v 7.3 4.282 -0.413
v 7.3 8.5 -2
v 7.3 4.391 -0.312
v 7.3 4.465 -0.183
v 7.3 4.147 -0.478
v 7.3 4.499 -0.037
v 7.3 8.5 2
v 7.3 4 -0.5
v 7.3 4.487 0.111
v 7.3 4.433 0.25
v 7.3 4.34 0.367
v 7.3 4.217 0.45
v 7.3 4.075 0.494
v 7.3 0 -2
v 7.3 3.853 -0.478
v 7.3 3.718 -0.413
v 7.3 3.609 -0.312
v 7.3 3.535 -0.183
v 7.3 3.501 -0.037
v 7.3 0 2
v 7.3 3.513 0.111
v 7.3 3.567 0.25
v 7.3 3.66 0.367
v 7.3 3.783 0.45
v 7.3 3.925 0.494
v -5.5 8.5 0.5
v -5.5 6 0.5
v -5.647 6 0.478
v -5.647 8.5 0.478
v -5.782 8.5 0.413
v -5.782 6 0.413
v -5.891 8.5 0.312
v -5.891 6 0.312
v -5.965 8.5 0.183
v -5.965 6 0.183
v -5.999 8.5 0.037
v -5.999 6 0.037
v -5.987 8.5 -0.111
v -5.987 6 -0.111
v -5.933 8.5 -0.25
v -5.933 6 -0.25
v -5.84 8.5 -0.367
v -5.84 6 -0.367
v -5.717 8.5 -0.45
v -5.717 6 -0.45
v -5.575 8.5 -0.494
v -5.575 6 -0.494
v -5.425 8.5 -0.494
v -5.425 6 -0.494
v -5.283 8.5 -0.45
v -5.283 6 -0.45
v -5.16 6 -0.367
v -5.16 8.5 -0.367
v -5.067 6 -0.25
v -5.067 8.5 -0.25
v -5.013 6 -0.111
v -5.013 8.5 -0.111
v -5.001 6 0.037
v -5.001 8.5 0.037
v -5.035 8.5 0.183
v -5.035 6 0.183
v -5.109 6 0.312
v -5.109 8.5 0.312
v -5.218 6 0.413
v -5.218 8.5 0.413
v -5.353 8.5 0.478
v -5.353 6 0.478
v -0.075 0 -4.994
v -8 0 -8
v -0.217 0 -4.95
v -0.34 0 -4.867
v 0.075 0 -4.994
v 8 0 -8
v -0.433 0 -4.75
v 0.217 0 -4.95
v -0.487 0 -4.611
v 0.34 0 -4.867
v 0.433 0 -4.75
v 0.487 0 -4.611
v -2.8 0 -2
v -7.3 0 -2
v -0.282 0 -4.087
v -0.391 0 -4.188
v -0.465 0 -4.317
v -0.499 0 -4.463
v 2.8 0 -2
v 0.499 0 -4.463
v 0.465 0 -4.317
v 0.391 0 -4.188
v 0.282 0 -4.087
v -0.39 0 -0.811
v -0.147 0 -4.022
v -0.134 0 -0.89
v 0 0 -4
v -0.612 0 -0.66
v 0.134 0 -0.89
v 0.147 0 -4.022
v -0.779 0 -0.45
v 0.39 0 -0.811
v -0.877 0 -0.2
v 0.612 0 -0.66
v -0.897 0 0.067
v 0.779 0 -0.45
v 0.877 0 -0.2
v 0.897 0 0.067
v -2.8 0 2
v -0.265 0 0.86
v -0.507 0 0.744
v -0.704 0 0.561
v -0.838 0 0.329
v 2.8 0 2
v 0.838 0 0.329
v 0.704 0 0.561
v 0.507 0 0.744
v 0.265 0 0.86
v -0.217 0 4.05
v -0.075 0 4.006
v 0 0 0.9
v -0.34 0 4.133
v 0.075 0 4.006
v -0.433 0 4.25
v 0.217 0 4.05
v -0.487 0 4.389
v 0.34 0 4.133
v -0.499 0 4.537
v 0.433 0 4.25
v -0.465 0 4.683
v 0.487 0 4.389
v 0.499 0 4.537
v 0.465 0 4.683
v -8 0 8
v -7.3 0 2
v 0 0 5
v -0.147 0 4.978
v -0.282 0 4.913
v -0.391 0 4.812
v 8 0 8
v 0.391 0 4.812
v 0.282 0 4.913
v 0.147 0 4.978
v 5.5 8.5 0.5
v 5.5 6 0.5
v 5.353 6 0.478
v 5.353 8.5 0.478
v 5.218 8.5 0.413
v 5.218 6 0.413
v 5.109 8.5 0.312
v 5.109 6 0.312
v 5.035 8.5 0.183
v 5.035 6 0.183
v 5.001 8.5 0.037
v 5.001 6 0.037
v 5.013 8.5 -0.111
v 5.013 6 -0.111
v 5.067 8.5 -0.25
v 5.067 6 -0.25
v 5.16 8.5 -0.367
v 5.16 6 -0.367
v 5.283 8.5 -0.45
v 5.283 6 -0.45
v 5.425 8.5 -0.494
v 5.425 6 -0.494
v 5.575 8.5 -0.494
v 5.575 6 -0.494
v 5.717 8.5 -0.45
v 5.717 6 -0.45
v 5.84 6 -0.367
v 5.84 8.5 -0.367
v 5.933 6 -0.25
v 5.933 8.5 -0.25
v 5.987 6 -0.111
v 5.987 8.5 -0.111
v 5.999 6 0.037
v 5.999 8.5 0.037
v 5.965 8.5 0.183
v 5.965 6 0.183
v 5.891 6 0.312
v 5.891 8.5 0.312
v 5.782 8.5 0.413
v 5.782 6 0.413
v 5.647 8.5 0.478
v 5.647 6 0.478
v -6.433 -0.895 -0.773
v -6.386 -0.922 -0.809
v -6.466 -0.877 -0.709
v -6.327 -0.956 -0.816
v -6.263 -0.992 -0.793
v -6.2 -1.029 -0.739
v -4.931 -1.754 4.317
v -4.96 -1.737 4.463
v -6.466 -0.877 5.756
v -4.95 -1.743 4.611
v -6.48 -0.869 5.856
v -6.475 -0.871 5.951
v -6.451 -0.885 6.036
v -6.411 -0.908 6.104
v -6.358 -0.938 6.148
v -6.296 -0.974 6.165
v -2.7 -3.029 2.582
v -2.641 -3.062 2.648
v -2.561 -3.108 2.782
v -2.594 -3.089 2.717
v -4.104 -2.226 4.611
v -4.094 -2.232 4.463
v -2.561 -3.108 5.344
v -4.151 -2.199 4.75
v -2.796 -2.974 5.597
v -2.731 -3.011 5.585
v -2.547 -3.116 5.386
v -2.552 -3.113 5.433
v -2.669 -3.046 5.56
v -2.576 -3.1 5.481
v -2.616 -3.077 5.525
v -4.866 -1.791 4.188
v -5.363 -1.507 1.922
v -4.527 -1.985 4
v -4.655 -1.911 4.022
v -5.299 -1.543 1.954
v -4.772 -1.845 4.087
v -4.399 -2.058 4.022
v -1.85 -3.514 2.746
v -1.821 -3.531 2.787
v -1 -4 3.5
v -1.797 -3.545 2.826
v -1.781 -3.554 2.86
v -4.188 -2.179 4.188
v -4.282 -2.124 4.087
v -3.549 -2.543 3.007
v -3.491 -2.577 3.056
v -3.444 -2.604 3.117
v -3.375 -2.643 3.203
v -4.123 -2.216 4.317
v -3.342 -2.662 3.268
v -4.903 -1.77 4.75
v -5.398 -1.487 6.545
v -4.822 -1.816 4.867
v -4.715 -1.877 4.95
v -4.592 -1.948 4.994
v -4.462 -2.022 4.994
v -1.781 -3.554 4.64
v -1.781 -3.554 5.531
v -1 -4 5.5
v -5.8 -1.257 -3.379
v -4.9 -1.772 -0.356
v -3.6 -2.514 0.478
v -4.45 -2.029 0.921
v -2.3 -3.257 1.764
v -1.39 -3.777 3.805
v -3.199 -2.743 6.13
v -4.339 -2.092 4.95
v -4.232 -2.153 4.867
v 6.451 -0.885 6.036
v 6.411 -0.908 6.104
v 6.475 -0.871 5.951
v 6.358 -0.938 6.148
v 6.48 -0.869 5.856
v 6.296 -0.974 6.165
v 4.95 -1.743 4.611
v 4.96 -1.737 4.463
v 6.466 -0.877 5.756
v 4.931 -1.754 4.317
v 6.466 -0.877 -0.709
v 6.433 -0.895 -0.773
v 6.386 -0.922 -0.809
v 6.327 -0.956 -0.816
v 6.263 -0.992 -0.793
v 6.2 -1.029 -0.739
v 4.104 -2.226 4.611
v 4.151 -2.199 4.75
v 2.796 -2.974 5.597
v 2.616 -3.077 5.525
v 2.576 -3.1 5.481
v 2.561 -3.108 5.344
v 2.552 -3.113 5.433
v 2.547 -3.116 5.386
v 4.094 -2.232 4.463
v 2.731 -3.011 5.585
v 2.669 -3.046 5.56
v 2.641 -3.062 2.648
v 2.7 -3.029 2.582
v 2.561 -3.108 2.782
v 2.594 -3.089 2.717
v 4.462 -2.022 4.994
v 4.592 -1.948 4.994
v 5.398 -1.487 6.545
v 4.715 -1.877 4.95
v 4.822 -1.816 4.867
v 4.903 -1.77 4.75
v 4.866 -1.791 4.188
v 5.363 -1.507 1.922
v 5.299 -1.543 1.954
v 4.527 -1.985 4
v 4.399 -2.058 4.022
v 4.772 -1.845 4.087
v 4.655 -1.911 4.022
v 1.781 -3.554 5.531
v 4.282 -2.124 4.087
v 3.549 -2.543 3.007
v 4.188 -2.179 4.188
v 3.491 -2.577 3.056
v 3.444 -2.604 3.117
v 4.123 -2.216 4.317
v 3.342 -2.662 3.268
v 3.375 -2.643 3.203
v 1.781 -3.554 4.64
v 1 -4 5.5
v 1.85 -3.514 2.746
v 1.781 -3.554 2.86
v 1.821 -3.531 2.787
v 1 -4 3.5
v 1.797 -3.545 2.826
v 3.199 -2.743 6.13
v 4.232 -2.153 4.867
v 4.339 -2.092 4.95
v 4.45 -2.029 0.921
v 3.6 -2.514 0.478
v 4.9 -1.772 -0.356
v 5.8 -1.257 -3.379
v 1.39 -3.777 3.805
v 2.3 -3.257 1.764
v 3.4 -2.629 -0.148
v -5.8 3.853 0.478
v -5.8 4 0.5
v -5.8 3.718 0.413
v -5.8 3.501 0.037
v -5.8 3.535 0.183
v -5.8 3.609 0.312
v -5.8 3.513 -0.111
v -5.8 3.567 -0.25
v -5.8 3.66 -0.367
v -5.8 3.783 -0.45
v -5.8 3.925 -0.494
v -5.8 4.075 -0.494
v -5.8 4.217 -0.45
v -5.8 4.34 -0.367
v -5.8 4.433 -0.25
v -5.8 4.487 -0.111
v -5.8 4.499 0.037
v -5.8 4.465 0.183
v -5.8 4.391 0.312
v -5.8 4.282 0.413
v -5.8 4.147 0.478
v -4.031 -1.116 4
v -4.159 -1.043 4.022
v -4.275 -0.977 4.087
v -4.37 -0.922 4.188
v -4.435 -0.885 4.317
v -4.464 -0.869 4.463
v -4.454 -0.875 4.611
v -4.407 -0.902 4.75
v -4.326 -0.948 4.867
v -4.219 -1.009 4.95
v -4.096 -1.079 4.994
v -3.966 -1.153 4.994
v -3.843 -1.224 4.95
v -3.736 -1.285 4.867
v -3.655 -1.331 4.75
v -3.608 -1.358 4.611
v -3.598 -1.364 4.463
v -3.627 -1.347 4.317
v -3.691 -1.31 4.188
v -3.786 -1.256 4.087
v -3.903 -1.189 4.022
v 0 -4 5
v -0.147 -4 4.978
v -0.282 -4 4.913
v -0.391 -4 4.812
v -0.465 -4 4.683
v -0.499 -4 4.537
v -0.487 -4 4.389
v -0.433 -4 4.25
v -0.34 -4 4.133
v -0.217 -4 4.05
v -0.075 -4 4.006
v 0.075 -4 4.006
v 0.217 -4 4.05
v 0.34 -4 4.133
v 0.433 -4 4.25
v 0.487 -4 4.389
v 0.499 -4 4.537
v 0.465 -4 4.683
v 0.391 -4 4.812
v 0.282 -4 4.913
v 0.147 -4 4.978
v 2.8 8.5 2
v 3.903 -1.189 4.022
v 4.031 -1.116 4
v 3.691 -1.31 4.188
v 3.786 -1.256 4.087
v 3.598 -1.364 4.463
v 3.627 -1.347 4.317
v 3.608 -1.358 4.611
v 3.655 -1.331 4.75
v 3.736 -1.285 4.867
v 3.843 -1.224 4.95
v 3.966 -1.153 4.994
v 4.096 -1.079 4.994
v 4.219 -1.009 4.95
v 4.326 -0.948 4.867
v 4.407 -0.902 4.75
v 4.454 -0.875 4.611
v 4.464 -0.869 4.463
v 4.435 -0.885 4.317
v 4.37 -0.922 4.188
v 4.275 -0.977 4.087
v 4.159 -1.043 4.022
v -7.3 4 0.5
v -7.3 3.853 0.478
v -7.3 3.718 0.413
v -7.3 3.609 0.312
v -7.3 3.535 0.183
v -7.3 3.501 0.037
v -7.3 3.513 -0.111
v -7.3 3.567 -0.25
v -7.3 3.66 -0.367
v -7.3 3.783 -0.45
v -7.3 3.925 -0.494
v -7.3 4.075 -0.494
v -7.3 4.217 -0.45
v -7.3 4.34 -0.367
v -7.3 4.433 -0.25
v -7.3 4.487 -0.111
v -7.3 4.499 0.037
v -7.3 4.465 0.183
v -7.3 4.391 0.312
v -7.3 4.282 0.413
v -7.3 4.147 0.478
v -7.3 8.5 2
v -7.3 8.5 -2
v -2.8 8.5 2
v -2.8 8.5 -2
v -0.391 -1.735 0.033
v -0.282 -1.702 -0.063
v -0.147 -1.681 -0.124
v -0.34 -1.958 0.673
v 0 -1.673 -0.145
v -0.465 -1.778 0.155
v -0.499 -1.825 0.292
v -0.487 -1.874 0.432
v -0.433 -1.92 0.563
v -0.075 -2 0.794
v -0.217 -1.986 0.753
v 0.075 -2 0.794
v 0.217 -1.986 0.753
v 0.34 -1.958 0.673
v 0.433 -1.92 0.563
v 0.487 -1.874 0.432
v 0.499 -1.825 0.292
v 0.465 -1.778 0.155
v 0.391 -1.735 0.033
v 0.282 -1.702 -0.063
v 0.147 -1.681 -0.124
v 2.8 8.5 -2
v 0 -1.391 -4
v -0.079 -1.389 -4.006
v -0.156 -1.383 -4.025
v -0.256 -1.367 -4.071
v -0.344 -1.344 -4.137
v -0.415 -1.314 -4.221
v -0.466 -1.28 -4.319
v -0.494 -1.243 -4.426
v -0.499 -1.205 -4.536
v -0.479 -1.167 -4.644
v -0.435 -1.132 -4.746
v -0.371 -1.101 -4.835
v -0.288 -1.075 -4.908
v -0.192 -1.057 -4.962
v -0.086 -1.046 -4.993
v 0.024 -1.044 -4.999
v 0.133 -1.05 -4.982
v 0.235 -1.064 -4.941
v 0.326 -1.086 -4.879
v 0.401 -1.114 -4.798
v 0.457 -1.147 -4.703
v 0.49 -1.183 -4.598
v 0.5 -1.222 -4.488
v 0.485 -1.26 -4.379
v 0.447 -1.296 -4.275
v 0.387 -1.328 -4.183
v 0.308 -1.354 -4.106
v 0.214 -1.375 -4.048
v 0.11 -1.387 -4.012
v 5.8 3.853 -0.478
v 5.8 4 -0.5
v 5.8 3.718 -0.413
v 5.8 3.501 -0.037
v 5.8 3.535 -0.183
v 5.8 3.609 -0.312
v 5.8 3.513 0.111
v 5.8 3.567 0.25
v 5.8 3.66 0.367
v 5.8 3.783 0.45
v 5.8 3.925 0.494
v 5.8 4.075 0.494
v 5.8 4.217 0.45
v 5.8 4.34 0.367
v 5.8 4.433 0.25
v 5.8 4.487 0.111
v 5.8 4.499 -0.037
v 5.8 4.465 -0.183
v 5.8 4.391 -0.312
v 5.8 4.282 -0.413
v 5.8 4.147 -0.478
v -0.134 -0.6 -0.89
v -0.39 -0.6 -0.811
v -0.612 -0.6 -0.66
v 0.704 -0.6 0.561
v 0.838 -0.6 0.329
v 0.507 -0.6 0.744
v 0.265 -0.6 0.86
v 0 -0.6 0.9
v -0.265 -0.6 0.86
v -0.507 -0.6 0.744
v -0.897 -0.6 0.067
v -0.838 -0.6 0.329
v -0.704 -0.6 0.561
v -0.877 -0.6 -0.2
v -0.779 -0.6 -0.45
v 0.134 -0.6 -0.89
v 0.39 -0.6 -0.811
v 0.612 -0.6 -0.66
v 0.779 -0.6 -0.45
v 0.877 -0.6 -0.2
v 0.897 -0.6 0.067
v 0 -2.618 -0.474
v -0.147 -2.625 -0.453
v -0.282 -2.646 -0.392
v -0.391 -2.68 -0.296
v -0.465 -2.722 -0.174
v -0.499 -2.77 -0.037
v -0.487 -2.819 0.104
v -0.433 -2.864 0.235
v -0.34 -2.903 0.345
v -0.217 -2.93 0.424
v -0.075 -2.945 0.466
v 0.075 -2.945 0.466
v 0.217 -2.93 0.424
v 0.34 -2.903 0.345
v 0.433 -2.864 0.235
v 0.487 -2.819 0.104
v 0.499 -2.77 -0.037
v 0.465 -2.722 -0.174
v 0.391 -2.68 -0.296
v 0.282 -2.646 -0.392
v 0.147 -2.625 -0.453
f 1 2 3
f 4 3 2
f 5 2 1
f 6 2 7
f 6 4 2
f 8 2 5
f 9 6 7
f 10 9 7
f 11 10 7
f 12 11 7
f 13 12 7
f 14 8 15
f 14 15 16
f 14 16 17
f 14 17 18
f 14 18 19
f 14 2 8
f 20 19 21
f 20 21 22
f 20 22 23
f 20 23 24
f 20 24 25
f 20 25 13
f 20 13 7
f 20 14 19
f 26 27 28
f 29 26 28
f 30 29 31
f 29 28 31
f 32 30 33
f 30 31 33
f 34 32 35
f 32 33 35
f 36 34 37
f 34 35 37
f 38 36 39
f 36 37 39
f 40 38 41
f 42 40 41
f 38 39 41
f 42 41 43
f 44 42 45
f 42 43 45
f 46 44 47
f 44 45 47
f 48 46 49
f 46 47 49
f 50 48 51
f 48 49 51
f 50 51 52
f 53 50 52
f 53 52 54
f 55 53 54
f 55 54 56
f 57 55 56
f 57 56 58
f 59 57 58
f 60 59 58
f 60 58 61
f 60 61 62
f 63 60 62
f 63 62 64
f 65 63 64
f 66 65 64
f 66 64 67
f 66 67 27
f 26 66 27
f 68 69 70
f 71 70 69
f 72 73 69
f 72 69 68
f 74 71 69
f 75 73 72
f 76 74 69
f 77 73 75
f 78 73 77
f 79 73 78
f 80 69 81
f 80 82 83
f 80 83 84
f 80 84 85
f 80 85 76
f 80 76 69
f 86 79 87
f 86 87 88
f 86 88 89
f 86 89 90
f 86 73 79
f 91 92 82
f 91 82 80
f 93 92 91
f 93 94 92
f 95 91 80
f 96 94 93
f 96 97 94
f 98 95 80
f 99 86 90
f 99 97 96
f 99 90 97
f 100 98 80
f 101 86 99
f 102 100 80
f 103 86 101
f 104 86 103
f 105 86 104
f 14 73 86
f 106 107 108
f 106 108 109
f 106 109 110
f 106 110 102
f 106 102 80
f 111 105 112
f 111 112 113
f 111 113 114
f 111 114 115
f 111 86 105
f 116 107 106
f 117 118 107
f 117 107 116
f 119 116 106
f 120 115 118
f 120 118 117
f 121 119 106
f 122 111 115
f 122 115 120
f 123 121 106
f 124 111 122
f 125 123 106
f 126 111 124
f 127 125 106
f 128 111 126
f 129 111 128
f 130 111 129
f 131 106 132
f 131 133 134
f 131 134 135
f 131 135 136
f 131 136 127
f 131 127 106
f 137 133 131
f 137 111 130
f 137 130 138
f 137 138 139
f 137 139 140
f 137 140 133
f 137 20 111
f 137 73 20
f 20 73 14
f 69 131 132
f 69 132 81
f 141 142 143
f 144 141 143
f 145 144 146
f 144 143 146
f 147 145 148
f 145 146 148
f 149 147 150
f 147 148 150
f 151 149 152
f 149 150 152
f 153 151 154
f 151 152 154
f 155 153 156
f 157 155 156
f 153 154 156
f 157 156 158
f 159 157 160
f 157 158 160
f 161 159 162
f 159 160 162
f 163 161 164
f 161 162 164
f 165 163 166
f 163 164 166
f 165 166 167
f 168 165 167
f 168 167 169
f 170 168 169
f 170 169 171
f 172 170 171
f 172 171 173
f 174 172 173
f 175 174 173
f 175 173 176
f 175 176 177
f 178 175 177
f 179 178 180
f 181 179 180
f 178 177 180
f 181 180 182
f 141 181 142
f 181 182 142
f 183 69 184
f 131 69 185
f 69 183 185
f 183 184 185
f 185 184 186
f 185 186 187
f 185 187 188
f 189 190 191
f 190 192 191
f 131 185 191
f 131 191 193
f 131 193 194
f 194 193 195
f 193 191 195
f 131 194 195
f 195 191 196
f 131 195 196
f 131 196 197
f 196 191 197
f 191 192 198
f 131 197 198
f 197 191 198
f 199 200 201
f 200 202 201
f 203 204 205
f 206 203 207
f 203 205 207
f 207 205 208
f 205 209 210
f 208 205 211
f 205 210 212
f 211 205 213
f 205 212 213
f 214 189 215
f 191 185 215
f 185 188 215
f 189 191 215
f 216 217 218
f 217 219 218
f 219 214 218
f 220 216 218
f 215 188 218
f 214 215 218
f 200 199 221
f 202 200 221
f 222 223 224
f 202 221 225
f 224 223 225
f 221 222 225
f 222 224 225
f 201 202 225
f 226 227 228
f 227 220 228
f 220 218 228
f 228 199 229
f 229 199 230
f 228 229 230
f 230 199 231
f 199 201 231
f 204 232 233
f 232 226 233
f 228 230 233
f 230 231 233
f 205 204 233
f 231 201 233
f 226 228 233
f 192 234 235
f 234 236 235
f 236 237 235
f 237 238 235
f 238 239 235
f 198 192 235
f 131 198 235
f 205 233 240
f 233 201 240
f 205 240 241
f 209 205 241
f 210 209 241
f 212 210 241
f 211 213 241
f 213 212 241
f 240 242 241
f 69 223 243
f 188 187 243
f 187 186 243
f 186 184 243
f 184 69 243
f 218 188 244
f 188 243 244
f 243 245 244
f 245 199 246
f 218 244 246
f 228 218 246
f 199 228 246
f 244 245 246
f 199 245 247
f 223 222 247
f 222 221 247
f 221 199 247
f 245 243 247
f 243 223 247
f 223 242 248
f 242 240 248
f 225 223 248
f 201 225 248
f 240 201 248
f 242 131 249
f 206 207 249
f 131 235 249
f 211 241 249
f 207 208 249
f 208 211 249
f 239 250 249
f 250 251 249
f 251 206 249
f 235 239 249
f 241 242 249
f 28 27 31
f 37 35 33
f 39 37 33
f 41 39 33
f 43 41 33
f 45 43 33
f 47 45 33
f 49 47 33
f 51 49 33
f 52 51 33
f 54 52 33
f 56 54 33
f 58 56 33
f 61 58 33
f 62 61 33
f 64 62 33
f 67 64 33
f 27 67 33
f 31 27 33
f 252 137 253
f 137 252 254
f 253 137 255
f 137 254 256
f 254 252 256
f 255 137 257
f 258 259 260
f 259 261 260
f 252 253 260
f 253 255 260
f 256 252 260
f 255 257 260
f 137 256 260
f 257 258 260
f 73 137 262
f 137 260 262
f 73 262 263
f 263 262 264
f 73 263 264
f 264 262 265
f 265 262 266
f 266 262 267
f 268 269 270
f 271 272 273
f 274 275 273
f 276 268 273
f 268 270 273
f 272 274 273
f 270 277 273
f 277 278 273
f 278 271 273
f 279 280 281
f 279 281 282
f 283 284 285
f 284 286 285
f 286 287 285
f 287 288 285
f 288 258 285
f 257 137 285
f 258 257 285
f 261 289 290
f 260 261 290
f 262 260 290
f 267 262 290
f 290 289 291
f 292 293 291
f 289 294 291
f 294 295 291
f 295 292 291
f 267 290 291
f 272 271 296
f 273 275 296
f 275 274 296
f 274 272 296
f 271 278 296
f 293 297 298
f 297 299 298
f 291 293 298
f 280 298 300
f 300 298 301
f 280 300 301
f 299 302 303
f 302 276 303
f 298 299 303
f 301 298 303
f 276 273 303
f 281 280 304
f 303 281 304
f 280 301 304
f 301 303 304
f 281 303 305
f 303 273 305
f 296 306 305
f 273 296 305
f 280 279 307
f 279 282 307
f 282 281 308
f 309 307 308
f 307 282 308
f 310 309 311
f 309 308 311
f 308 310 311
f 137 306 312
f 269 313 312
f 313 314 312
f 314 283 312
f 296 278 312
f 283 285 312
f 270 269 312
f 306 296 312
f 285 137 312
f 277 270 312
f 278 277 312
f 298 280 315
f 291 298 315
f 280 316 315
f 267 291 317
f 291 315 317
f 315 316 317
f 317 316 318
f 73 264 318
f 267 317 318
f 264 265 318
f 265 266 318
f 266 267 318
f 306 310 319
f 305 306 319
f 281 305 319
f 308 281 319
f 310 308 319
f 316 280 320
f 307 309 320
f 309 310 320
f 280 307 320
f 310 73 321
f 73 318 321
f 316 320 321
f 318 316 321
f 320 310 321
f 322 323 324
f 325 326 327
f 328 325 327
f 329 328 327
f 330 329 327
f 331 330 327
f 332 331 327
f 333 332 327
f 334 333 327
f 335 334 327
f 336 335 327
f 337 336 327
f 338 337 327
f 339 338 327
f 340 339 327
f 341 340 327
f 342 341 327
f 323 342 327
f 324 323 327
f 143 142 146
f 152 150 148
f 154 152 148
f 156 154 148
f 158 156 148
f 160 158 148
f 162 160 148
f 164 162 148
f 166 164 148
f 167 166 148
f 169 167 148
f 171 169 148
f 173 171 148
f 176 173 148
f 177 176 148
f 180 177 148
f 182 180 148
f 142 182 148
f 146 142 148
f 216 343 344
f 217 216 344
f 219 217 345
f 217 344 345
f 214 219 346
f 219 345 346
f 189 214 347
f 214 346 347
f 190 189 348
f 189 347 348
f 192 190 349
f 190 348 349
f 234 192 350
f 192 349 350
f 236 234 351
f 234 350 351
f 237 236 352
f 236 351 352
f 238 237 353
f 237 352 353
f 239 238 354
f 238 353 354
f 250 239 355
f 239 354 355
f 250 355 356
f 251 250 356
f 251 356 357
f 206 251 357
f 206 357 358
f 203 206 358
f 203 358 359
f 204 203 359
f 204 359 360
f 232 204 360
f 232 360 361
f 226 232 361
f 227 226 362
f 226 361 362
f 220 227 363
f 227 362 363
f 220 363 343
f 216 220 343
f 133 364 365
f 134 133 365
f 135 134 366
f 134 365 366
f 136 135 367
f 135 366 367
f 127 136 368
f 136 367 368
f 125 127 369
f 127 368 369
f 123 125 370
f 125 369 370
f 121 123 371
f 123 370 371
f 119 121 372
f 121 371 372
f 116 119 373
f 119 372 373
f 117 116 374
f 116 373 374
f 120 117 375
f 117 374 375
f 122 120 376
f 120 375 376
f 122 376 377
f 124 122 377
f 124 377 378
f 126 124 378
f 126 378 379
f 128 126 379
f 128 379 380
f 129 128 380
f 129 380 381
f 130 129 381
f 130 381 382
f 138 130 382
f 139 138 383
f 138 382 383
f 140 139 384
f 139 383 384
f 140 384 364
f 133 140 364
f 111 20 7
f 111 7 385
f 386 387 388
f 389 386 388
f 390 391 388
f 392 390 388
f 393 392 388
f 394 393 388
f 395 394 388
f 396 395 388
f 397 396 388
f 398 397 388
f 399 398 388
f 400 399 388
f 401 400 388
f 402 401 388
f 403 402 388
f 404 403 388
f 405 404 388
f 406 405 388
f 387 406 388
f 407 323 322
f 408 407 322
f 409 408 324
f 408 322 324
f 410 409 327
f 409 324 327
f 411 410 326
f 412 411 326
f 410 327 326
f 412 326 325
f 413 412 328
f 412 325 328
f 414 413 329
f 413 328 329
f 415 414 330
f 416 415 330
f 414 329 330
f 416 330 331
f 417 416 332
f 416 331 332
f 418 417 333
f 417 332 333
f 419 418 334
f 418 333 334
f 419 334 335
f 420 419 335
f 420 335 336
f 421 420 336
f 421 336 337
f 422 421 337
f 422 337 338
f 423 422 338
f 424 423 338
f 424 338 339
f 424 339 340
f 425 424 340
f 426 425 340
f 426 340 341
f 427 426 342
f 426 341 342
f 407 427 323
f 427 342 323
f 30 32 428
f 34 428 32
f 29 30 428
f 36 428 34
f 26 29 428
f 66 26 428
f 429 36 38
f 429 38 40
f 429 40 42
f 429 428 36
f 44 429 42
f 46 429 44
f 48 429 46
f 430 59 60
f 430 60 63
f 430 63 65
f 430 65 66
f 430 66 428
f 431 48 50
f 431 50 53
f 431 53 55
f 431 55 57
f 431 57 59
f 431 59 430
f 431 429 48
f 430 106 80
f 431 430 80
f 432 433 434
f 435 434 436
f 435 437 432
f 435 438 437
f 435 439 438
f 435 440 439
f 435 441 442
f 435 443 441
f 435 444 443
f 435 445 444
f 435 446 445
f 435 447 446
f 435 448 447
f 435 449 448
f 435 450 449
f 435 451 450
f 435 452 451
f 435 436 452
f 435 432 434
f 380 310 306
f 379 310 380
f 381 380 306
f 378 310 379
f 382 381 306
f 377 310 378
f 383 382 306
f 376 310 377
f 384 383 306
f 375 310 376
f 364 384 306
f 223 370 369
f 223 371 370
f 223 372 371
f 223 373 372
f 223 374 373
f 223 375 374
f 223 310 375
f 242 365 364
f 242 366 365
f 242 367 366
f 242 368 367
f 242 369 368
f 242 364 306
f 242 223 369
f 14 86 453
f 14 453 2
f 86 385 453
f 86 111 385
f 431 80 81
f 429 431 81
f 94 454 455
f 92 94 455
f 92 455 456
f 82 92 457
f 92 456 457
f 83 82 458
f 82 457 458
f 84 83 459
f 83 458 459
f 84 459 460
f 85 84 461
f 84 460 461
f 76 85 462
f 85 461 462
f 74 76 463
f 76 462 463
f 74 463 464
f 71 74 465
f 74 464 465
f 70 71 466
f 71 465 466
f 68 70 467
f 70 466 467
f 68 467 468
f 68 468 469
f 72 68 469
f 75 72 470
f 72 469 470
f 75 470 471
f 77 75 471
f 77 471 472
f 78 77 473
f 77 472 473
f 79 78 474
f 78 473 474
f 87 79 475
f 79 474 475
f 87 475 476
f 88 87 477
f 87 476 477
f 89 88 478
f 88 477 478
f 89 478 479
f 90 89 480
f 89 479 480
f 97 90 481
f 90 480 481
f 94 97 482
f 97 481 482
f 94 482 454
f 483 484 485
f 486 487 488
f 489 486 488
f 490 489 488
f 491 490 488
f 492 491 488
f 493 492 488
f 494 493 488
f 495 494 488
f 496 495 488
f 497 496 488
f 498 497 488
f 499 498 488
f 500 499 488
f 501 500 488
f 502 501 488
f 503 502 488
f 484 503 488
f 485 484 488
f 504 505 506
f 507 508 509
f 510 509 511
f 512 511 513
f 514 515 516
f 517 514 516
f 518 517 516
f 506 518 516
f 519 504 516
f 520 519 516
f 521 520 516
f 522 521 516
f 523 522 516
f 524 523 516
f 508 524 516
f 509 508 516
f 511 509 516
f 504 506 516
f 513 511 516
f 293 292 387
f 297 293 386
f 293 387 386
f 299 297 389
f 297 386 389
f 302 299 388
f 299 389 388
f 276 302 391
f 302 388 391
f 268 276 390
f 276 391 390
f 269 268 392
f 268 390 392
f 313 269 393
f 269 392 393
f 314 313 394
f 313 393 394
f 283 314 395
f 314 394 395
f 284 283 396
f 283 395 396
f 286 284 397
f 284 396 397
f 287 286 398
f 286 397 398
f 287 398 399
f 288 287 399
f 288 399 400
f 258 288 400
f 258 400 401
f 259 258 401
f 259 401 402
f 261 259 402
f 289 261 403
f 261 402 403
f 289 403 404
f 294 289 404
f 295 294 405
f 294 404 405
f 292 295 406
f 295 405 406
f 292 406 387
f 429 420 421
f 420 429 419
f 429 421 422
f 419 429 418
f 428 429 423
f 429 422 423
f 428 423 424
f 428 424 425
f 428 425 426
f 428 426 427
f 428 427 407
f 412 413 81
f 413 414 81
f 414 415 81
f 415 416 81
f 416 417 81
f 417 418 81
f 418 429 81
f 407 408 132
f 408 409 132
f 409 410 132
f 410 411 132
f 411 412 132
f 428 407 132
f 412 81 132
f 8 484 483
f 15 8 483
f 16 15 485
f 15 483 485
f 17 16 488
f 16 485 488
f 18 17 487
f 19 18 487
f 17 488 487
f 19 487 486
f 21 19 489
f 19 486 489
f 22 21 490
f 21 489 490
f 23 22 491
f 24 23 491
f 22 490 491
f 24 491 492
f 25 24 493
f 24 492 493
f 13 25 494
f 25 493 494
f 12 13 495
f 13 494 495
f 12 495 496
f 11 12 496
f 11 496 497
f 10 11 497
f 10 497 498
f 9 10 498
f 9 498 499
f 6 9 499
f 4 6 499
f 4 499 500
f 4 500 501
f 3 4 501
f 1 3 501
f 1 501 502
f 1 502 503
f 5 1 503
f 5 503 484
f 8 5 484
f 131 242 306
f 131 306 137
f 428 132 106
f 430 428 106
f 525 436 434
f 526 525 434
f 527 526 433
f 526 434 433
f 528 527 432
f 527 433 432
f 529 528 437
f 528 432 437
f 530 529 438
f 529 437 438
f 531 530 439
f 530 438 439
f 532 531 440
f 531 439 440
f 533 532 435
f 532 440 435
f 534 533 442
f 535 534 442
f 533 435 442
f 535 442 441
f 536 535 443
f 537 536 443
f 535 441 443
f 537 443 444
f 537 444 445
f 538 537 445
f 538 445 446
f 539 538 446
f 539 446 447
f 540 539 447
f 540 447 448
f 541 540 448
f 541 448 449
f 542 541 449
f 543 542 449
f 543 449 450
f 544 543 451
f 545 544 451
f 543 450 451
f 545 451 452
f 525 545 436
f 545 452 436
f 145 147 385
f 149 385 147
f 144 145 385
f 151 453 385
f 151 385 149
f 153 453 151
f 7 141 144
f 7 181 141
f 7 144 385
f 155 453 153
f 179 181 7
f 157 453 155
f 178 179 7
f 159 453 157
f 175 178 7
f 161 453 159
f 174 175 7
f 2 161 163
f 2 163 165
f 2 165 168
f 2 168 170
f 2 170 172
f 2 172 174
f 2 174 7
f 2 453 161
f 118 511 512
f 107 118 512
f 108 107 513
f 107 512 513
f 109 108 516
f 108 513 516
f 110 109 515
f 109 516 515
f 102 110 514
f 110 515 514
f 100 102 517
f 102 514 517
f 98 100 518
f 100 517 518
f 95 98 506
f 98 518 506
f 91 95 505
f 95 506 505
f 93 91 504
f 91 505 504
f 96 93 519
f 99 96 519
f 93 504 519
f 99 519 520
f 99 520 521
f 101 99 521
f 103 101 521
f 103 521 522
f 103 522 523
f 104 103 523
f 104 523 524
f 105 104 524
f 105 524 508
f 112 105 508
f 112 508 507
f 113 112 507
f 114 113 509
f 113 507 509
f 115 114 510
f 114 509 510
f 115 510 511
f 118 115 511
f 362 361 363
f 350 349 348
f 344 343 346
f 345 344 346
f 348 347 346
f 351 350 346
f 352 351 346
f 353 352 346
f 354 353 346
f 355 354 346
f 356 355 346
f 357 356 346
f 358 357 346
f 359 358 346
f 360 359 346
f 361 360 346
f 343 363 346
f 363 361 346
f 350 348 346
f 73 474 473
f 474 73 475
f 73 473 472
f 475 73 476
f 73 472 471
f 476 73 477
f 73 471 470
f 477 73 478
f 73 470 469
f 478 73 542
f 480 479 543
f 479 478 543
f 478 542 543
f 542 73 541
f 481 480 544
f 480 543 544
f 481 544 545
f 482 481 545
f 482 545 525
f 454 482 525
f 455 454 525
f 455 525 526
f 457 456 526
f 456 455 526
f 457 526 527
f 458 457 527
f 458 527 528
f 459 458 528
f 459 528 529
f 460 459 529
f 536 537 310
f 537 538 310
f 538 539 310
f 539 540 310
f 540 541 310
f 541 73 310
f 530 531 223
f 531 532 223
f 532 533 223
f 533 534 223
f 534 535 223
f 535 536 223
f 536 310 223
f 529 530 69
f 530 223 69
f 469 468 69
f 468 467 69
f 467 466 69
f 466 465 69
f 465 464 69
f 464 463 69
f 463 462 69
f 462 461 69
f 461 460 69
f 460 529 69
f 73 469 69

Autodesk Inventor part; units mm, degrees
ref_plane "YZ Plane" through (0, 0, 0) normal (1, 0, 0) x (0, 1, 0)
ref_plane "XZ Plane" through (0, 0, 0) normal (0, 1, 0) x (-1, 0, 0)
sketch "Sketch1" plane through (0, 0, 0) normal (0, 1, 0) x (-1, 0, 0)
  line L0 (-8, 0) -> (-8, 8)
  line L1 (-8, 8) -> (8, 8)
  line L2 (8, 8) -> (8, -8)
  line L3 (8, -8) -> (-8, -8)
  line L4 (-8, -8) -> (-8, 0)
  circle A0 centre (0, 0) radius 1.5
  line L5 (8, 8) -> (8, 4.5)
  line L6 (8, 4.5) -> (5, 4.5)
  line L7 (-8, 8) -> (-8, 4.5)
  line L8 (-8, 4.5) -> (-5, 4.5)
  line L9 (0, 0) -> (0, 4.5)
  dimension "d0" = 8
  dimension "d1" = 8
  dimension "d2" = 16
  dimension "d3" = 16
  dimension "d4" = 16
  dimension "d5" = 8
  dimension "d25" = 3
  dimension "d95" = 3.5
  dimension "d96" = 3
  dimension "d106" = 3.5
  dimension "d107" = 3
  dimension "d196" = 4.5
ref_plane "Work Plane2" through (8, -4, 0) normal (0, -1, 0) x (0, 0, 1)
sketch "Sketch3" plane through (8, -4, 0) normal (0, -1, 0) x (0, 0, 1)
  line L0 (5.5, 8) -> (5.5, 7)
  line L1 (5.5, 7) -> (3.5, 7)
  line L2 (3.5, 7) -> (3.5, 9)
  line L3 (3.5, 9) -> (5.5, 9)
  line L4 (5.5, 9) -> (5.5, 8)
  line L5 (0, 8) -> (3.5, 8)
  dimension "d16" = 1
  dimension "d17" = 2
  dimension "d18" = 2
  dimension "d19" = 2
  dimension "d20" = 1
  dimension "d27" = 3.5
loft "Loft1" add profiles "Sketch1", "Sketch3" contours L0 L1 L2 L3 L4 | A0 / all
sketch "Sketch5" plane through (-8, 0, -8) normal (0, 1, 0) x (1, 0, 0)
  line L0 (8, -8) -> (8, -12.5)
  circle A0 centre (8, -12.5) radius 0.5
  dimension "d28" = 4.5
  dimension "d29" = 1
hole "Hole1" at (0, 0, 4.5) direction (0, -1, 0) diameter 1 depth 4
sketch "Sketch6" plane through (-8, 0, -8) normal (0, 1, 0) x (1, 0, 0)
  line L0 (8, -8) -> (10.8, -8)
  line L1 (16, 0) -> (16, -16) projected
  line L2 (10.8, -8) -> (10.8, -6)
  line L3 (10.8, -6) -> (15.3, -6)
  line L4 (15.3, -6) -> (15.3, -10)
  line L5 (15.3, -10) -> (10.8, -10)
  line L6 (10.8, -10) -> (10.8, -8)
  line L7 (15.3, -8) -> (16, -8)
  dimension "d180" = 2
  dimension "d181" = 4.5
  dimension "d182" = 4
  dimension "d183" = 4.5
  dimension "d184" = 2
  dimension "d185" = 0.7
  dimension "d197" = 2.8
extrude "Extrusion1" add sketch "Sketch6" along normal blind 8.5
sketch "Sketch7" plane through (-8, 8.5, -8) normal (0, 1, 0) x (1, 0, 0)
  line L0 (8, -8) -> (13.5, -8)
  circle A0 centre (13.5, -8) radius 0.5
  circle A1 centre (13.5, -8) radius 0.75
  dimension "d48" = 5.5
  dimension "d49" = 1
  dimension "d57" = 1.5
hole "Hole2" at (5.5, 8.5, 0) direction (0, -1, 0) diameter 1 depth 2.5
sketch "Sketch8" plane through (-8, 0, -8) normal (0, 1, 0) x (1, 0, 0)
  line L0 (8, -8) -> (5.2, -8)
  line L1 (5.2, -8) -> (5.2, -6)
  line L2 (5.2, -6) -> (0.7, -6)
  line L3 (0.7, -6) -> (0.7, -10)
  line L4 (0.7, -10) -> (5.2, -10)
  line L5 (5.2, -10) -> (5.2, -8)
  line L6 (0.7, -8) -> (0, -8)
  dimension "d58" = 2.8
  dimension "d59" = 2
  dimension "d60" = 4.5
  dimension "d61" = 4
  dimension "d62" = 4.5
  dimension "d63" = 2
  dimension "d179" = 0.7
extrude "Extrusion2" add sketch "Sketch8" along normal blind 8.5
sketch "Sketch9" plane through (-8, 8.5, -8) normal (0, 1, 0) x (1, 0, 0)
  line L0 (8, -8) -> (2.5, -8)
  circle A0 centre (2.5, -8) radius 0.5
  circle A1 centre (2.5, -8) radius 0.75
  dimension "d66" = 5.5
  dimension "d67" = 1
  dimension "d75" = 1.5
hole "Hole3" at (-5.5, 8.5, 0) direction (0, -1, 0) diameter 1 depth 2.5
sketch "Sketch11" plane through (-7.3, 0, -2) normal (-1, 0, 0) x (0, 0, 1)
  line L0 (2, 0) -> (2, 4)
  circle A0 centre (2, 4) radius 0.5
  dimension "d85" = 4
  dimension "d86" = 1
hole "Hole5" at (-7.3, 4, 0) direction (1, 0, 0) diameter 1 depth 1.5
sketch "Sketch13" plane through (-8, 0, -8) normal (-0.4961389, -0.8682431, 0) x (0.8682431, -0.4961389, 0)
  line L0 (0, 16) -> (0, 0) projected
  line L1 (0, 16) -> (0, 12.5)
  line L2 (0, 12.5) -> (4, 12.5)
  circle A0 centre (4, 12.5) radius 0.25
  point P0 (6.9459, 8)
  dimension "d97" = 3.5
  dimension "d98" = 0.5
  dimension "d118" = 4
hole "Hole6" at (-4.527, -1.9846, 4.5) direction (0.4961389, 0.8682431, 0) diameter 1 depth 1
sketch "Sketch14" plane through (8, 0, -8) normal (0.4961389, -0.8682431, 0) x (0.8682431, 0.4961389, 0)
  line L0 (0, 16) -> (-8.0623, 13.5) projected
  line L1 (0, 16) -> (0, 12.5)
  line L2 (0, 0) -> (0, 16) projected
  line L3 (0, 12.5) -> (-4, 12.5)
  circle A0 centre (-4, 12.5) radius 0.25
  point P0 (-6.9459, 8)
  dimension "d108" = 3.5
  dimension "d109" = 0.5
  dimension "d117" = 4
hole "Hole7" at (4.527, -1.9846, 4.5) direction (-0.4961389, 0.8682431, 0) diameter 1 depth 1
sketch "Sketch15" plane through (-8, 0, -8) normal (0, -0.9444968, -0.3285206) x (1, 0, 0)
  line L0 (0, 0) -> (16, 0) projected
  line L1 (0, 0) -> (8, 0)
  line L2 (8, 0) -> (8, 8.4687)
  circle A0 centre (8, 8.4687) radius 0.25
  dimension "d119" = 8
  dimension "d120" = 0.5
hole "Hole8" at (0, -2.7821, -0.0014) direction (0, 0.9444968, 0.3285206) diameter 1 depth 1
sketch "Sketch17" plane through (-8, 0, -8) normal (0, 1, 0) x (1, 0, 0)
  line L0 (8, -8) -> (8, -3.5)
  circle A0 centre (8, -3.5) radius 0.25
  dimension "d128" = 4.5
  dimension "d129" = 0.5
hole "Hole9" at (0, 0, -4.5) direction (0, -1, 0) diameter 1 depth 3
sketch "Sketch21" plane through (-8, 0, -8) normal (0, 1, 0) x (1, 0, 0)
  circle A0 centre (8, -8) radius 0.8
  dimension "d171" = 1.6
hole "Hole12" at (0, 0, 0) direction (0, -1, 0) diameter 1.8 depth 0.6
sketch "Sketch22" plane through (7.3, 0, 2) normal (1, 0, 0) x (0, 0, -1)
  line L0 (2, 0) -> (2, 4)
  line L1 (2, 0) -> (6, 0) construction
  circle A0 centre (2, 4) radius 0.5
  dimension "d186" = 4
  dimension "d187" = 90
  dimension "d188" = 1
hole "Hole13" at (7.3, 4, 0) direction (-1, 0, 0) diameter 1 depth 1.5
sketch "Sketch23" plane through (-8, 0, -8) normal (0, 1, 0) x (1, 0, 0)
  line L0 (15.3, -10) -> (10.8, -10) projected
  line L1 (15.3, -10) -> (15.3, -15)
  point P0 (8, -8)
  dimension "d198" = 5
ref_plane "Work Plane" through (8, 0, 0) normal (0, -1, 0) x (0, 0, 1)
properties material "ABS Plastic"
